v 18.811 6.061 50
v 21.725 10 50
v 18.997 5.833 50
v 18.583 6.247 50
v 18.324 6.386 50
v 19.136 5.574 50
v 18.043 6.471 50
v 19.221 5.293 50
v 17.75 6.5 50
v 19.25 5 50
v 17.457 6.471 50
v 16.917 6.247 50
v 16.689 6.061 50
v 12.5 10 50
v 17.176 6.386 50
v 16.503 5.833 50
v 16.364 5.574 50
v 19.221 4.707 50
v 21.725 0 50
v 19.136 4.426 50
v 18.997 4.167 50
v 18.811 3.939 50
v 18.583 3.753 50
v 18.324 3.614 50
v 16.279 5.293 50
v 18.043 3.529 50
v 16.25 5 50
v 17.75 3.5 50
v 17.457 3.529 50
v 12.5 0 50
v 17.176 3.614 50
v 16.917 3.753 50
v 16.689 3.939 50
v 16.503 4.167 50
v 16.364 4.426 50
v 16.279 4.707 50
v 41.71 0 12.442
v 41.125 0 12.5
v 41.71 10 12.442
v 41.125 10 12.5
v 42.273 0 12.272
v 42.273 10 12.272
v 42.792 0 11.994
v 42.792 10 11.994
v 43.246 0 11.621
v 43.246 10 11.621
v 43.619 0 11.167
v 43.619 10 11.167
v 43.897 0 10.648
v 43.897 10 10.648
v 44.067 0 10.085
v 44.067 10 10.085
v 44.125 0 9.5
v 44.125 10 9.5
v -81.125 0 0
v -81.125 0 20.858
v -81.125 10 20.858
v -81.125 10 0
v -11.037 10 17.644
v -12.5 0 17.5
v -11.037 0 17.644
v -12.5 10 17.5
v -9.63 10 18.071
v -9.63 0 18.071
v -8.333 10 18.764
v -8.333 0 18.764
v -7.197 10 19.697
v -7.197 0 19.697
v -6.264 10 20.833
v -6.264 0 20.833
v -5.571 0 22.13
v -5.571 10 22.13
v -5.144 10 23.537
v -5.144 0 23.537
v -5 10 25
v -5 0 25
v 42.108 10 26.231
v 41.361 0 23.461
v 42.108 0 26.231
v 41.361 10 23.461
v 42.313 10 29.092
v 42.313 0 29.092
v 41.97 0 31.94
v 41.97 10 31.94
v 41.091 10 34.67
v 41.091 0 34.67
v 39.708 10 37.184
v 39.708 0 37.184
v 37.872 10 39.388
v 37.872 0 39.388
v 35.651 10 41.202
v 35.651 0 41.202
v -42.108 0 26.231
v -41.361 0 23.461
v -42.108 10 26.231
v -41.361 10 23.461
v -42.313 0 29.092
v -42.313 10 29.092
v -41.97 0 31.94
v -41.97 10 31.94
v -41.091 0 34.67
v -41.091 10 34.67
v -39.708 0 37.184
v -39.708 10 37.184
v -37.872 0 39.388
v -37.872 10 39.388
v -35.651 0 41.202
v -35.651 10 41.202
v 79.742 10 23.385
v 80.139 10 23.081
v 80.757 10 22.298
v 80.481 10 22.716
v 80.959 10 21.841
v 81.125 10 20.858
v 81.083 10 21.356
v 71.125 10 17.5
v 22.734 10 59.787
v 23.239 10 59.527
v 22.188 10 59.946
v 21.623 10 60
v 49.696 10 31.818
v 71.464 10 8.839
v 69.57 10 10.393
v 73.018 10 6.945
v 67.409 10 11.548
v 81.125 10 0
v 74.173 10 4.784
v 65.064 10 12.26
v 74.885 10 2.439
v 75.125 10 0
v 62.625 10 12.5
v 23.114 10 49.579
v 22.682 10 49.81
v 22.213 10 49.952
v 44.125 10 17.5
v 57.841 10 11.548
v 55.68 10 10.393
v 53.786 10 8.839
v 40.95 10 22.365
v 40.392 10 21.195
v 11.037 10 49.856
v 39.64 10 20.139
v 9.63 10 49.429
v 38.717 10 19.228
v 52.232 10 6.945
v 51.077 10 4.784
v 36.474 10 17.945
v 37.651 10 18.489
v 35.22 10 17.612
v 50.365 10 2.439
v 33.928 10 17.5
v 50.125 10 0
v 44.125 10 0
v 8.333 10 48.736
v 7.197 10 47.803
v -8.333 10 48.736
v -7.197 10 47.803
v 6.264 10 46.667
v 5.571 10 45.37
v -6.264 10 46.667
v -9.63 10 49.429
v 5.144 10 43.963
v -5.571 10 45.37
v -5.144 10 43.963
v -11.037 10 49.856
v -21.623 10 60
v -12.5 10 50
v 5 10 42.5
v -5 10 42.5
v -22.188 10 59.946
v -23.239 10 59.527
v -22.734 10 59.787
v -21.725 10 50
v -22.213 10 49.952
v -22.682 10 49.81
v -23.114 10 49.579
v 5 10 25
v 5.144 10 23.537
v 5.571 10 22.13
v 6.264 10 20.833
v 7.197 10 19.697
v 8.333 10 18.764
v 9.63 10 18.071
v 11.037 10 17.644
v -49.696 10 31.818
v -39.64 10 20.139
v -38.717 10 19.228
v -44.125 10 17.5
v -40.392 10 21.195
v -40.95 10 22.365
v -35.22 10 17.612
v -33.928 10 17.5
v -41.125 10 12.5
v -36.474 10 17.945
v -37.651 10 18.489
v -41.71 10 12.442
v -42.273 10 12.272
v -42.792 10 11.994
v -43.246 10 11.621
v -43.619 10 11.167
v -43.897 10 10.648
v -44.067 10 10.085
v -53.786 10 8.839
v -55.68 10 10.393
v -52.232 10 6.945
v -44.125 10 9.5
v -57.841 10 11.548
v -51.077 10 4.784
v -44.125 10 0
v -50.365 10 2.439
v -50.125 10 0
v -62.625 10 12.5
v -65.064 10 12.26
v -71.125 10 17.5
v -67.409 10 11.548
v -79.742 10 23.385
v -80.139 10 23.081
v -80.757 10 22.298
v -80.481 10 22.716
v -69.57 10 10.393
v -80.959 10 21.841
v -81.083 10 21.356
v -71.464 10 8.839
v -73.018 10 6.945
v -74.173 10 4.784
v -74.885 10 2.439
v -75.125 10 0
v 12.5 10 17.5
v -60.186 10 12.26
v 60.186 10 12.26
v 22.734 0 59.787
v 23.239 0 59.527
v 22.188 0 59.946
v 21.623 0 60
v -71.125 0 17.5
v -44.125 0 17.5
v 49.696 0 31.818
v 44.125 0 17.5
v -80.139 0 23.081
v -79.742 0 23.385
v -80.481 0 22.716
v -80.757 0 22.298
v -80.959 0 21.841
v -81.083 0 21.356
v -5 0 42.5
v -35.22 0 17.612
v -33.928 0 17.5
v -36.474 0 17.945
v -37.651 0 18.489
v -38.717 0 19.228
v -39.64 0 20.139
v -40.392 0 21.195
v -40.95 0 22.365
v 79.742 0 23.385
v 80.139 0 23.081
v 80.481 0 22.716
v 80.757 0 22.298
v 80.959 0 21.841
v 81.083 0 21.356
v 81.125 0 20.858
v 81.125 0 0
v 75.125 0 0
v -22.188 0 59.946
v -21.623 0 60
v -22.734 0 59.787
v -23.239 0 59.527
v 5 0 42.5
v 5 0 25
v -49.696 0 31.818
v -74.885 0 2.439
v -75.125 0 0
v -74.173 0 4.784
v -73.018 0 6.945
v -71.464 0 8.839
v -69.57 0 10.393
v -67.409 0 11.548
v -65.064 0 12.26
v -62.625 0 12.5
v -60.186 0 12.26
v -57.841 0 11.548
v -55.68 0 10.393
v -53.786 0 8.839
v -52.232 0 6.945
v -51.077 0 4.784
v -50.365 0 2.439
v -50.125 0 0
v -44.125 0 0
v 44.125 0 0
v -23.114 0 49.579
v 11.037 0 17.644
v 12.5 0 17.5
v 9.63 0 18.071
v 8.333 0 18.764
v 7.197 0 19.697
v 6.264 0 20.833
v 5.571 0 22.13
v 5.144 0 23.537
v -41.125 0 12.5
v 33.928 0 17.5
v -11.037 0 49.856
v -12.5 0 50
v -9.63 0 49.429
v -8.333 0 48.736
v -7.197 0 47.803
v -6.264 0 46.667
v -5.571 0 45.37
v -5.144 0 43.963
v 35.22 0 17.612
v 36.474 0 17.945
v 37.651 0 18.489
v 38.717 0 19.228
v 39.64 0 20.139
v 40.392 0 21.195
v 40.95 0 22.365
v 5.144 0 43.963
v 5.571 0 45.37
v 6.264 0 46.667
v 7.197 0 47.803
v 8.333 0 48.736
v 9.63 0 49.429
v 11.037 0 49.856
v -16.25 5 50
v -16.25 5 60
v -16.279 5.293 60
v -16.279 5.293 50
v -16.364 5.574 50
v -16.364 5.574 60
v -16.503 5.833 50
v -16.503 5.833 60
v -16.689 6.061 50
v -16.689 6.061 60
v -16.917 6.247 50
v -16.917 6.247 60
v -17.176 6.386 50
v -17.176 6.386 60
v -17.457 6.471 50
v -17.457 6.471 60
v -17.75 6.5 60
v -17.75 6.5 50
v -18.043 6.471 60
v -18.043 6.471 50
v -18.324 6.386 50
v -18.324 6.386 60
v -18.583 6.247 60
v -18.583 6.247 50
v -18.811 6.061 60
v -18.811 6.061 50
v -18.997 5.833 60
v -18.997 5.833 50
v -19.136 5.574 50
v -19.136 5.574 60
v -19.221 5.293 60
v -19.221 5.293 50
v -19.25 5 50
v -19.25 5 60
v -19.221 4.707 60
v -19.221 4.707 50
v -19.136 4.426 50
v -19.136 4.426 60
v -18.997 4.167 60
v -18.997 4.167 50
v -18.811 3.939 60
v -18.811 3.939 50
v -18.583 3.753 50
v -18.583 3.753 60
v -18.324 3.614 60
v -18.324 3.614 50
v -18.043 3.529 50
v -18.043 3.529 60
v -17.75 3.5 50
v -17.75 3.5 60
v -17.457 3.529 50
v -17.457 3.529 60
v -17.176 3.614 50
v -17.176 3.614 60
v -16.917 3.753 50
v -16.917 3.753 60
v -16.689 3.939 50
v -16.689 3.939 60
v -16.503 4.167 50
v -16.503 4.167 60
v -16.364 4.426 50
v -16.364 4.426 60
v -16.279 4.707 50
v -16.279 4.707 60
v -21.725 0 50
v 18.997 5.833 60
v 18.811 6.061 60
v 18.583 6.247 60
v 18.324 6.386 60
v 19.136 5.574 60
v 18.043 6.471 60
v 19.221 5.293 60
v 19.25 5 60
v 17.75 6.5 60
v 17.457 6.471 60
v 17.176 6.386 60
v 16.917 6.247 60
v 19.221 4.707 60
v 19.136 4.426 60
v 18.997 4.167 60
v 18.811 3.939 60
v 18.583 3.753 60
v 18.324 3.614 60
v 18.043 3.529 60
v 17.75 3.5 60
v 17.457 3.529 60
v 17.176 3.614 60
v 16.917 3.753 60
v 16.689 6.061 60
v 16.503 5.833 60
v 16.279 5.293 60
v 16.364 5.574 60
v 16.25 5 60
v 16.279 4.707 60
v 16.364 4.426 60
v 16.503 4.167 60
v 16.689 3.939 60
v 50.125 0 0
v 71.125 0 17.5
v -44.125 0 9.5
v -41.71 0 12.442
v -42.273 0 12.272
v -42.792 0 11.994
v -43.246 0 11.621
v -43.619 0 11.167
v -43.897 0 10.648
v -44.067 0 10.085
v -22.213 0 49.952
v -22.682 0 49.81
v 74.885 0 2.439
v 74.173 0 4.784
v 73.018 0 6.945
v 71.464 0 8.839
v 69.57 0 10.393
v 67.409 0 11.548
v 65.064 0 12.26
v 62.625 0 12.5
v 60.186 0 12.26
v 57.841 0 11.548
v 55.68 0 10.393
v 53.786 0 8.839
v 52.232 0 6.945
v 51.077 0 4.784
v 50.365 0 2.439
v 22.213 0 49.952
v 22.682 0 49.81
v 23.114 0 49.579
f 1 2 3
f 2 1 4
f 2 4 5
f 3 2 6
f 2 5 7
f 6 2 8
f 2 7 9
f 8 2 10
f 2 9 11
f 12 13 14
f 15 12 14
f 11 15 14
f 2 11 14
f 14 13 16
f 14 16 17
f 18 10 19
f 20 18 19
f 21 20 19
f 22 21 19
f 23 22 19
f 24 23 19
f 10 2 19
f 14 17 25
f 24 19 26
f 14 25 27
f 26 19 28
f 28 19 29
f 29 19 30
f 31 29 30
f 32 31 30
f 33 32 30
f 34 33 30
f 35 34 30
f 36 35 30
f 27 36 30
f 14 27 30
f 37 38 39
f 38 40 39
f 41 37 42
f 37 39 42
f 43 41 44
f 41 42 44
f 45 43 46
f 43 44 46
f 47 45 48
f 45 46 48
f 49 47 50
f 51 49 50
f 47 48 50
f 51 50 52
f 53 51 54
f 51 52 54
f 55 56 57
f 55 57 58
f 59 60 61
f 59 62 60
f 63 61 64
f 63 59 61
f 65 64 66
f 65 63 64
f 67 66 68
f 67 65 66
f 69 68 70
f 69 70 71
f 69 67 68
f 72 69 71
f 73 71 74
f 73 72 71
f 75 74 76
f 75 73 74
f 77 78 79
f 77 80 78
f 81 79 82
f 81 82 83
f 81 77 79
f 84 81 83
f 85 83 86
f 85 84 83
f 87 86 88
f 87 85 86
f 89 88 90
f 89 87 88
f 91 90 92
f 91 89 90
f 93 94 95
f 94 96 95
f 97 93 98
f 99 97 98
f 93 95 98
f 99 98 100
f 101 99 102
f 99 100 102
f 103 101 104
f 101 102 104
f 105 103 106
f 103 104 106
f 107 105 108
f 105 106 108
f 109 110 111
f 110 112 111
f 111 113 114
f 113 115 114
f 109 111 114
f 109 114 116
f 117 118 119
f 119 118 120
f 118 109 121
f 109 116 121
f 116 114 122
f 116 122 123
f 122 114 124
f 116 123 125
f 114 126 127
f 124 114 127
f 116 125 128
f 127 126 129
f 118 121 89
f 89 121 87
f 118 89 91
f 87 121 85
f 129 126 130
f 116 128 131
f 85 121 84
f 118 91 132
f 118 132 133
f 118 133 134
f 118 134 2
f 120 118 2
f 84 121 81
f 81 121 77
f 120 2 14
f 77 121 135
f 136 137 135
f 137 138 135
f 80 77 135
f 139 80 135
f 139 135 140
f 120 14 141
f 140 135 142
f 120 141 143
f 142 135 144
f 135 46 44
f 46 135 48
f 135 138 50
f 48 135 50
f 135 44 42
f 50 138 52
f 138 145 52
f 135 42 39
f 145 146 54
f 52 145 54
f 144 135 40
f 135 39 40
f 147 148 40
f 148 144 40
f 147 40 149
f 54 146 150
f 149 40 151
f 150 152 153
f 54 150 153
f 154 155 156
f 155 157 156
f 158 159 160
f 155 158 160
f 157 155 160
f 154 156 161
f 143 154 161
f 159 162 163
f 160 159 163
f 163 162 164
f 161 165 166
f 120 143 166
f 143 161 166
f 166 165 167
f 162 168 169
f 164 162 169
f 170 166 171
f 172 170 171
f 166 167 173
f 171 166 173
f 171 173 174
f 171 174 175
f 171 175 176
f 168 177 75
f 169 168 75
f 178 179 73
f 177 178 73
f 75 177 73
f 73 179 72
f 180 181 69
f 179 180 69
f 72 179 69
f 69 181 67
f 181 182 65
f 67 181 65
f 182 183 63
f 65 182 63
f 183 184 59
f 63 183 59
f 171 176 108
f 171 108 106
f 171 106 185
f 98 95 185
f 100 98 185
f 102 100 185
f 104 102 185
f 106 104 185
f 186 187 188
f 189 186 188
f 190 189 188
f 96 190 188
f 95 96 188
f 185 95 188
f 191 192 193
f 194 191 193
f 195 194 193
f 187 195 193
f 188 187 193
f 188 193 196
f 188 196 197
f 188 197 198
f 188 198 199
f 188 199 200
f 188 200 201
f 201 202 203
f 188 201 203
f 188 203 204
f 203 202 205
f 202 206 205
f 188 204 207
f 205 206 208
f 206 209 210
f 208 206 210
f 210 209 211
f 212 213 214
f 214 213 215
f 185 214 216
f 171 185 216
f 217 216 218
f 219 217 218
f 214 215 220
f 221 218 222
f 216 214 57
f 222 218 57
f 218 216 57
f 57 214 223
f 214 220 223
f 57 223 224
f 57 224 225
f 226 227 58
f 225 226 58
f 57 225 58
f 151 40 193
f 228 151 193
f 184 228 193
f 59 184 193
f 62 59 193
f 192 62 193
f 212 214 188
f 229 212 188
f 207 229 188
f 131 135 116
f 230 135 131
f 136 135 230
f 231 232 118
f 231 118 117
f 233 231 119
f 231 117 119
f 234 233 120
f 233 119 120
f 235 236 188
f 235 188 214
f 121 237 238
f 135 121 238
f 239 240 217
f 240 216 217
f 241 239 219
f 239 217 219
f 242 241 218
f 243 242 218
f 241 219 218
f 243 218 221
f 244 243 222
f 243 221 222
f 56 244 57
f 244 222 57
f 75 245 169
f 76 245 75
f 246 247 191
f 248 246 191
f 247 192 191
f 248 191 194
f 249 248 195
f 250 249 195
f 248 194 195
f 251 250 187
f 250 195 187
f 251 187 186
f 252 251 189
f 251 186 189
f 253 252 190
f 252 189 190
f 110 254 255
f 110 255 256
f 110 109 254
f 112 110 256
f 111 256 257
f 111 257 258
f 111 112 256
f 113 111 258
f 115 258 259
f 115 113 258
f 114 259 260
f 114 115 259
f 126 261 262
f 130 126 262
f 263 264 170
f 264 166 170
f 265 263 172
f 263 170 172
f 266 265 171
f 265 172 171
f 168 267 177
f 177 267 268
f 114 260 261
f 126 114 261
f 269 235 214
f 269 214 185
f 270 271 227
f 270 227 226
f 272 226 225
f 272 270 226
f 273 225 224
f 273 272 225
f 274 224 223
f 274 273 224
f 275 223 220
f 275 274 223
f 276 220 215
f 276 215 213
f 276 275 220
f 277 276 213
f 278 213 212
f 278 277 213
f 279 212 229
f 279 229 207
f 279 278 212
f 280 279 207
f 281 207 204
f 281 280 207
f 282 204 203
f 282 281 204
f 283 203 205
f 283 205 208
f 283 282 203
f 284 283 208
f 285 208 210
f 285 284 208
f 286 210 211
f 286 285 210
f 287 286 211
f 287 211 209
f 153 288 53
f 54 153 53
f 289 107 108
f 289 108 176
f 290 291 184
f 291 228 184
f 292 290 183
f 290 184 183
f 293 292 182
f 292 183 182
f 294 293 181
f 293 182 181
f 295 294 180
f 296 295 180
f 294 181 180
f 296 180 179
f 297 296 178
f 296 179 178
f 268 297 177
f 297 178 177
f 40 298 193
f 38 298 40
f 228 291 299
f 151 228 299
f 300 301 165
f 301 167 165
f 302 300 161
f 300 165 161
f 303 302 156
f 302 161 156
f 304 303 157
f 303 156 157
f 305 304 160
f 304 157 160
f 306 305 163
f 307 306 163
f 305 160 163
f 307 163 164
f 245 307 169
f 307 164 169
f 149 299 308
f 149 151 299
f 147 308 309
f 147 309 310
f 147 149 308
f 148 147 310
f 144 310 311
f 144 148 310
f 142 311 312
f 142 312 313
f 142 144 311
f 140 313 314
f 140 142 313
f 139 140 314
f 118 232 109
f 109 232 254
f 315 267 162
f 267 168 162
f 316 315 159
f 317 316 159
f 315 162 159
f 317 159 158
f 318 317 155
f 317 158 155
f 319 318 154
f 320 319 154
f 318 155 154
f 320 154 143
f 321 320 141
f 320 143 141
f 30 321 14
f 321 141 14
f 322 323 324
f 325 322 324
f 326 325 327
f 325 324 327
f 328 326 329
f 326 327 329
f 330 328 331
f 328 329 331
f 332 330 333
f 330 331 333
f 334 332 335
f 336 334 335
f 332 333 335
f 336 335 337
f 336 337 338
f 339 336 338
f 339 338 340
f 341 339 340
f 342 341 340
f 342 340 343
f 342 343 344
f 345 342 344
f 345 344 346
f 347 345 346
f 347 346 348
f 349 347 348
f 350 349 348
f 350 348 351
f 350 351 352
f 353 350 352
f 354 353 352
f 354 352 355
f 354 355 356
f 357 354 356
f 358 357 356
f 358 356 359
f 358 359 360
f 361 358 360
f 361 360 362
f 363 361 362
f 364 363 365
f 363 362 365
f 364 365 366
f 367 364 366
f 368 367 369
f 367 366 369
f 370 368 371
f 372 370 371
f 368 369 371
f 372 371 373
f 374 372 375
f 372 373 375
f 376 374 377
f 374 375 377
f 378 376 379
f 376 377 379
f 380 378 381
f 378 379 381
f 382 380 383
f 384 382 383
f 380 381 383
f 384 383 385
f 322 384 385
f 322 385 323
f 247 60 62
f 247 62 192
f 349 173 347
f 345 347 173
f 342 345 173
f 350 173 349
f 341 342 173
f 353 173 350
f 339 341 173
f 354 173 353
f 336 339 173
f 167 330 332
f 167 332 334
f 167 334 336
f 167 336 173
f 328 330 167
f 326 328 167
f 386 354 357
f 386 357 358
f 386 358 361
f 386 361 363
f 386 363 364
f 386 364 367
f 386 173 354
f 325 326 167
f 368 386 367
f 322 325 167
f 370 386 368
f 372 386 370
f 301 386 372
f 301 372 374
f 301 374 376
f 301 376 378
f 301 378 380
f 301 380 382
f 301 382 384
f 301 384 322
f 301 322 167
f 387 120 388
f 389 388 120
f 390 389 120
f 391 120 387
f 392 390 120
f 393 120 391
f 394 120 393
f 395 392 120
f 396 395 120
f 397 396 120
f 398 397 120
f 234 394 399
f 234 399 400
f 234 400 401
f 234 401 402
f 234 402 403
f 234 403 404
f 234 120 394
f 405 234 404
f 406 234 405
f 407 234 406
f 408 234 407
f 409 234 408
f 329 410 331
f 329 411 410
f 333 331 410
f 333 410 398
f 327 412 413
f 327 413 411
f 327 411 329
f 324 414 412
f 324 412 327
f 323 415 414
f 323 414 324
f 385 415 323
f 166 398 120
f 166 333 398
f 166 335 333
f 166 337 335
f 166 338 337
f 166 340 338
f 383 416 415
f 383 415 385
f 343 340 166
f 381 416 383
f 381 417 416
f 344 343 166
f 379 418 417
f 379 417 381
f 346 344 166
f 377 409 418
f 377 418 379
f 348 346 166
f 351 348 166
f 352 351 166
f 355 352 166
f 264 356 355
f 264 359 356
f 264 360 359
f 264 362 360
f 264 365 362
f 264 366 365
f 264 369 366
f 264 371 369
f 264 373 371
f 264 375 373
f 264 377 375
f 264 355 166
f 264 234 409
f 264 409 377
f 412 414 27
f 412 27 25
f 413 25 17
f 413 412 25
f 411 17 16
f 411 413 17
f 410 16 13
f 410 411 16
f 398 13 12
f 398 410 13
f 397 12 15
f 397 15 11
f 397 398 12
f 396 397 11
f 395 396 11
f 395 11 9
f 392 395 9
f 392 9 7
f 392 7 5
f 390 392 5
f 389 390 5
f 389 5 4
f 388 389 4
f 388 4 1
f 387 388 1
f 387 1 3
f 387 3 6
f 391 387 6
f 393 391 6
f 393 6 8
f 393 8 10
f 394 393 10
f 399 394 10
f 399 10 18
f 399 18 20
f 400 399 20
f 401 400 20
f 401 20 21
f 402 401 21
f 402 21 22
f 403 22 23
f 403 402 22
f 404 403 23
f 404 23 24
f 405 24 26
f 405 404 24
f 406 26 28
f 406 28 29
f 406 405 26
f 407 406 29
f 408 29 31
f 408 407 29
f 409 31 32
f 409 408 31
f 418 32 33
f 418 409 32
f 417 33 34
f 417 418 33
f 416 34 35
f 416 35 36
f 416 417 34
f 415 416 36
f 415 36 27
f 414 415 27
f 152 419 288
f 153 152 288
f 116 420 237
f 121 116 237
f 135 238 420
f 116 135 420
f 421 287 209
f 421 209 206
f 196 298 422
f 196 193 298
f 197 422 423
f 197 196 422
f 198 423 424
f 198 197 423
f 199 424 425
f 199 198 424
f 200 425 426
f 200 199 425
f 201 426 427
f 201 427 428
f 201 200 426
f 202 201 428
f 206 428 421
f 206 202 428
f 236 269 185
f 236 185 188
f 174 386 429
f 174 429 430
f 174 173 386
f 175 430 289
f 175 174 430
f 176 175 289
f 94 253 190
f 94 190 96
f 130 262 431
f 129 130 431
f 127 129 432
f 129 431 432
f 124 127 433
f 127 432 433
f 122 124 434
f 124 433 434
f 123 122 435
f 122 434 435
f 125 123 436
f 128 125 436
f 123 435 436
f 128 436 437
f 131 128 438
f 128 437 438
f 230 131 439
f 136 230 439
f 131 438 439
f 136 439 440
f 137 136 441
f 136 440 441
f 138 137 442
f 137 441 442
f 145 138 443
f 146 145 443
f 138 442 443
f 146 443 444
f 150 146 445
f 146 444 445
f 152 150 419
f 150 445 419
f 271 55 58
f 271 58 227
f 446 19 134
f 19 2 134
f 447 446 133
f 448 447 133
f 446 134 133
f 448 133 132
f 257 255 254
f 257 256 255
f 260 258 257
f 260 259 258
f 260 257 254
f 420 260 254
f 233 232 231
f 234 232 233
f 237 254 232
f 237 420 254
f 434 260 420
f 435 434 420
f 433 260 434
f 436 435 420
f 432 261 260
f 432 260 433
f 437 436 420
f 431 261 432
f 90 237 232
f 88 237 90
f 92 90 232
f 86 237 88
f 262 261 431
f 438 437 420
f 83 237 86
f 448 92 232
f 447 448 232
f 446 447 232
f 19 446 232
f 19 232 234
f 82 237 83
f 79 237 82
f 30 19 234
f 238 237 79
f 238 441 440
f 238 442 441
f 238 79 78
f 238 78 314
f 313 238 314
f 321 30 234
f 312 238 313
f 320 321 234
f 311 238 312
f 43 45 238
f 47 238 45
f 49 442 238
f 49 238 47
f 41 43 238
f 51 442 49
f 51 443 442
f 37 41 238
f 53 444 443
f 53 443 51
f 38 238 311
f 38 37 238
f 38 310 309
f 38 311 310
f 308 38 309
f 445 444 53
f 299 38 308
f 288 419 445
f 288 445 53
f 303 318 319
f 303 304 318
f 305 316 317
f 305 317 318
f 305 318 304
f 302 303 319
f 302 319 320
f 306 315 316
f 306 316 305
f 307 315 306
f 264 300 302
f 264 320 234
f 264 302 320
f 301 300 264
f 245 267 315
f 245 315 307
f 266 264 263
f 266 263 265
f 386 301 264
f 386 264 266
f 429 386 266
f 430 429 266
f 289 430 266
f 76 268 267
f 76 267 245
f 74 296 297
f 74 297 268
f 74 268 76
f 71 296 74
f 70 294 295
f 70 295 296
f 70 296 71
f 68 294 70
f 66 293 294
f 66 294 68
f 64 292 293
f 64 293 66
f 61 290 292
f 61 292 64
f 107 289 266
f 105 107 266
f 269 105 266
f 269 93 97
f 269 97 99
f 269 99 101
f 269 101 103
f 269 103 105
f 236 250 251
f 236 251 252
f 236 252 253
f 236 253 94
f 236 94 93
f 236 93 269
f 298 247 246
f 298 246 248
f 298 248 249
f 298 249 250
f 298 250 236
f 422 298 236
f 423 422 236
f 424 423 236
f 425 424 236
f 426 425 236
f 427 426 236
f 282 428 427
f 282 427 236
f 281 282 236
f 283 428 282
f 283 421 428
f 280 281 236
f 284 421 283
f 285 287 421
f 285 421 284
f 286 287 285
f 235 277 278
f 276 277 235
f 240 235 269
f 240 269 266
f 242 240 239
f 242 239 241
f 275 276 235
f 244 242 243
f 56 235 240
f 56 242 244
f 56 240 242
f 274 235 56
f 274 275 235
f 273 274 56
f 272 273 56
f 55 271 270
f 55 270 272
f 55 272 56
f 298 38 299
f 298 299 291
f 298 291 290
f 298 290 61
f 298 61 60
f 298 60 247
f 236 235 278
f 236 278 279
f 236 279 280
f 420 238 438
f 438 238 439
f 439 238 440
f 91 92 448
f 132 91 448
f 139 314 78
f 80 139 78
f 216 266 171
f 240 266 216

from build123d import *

# Parameters (mm, degrees)
BOSS_EXTRUDE1_DEPTH = 10
CUT_EXTRUDE5_REACH  = 103.397
SKETCH9_R           = 1.5
FILLET13_R          = 7.5
FILLET14_R          = 15
FILLET16_R          = 7.5
FILLET18_R          = 7.5
FILLET19_R          = 7.5
FILLET22_R          = 3
FILLET23_R          = 3
FILLET24_R          = 15
FILLET28_R          = 3
FILLET29_R          = 3
FILLET30_R          = 3
FILLET31_R          = 3
FILLET32_R          = 7.5
FILLET34_R          = 7.5
FILLET35_R          = 2.5
FILLET36_R          = 2.5


with BuildPart() as part:
    # Sketch1 → Boss-Extrude1 (new body)
    with BuildSketch(Plane(origin=(0, 0, 0), x_dir=(1, 0, 0), z_dir=(0, 1, 0))):
        with BuildLine():
            Line((0, -12.5), (0, -60))
            Line((0, -60), (22.5, -60))
            Line((22.5, -60), (81.125, -22.5))
            Line((81.125, -22.5), (81.125, 0))
            Line((81.125, 0), (75.125, 0))
            ThreePointArc((75.125, 0), (62.625, -12.5), (50.125, 0))
            Line((50.125, 0), (44.125, 0))
            Line((44.125, 0), (44.125, -12.5))
            Line((44.125, -12.5), (0, -12.5))
        make_face()
        Polygon((39.125, -17.5), (45.538841531, -34.595428821), (22.483333333, -50), (5, -50), (5, -17.5), align=None, mode=Mode.SUBTRACT)
        Polygon((71.125, -17.5), (49.69624181, -31.817655806), (44.125, -17.5), align=None, mode=Mode.SUBTRACT)
    boss_extrude1 = extrude(amount=BOSS_EXTRUDE1_DEPTH)

    # Mirror1: Boss-Extrude1 across plane
    add(boss_extrude1.mirror(Plane(origin=(0, 10, 0), x_dir=(0, 0, 1), z_dir=(-1, 0, 0))))

    # Sketch9 → Cut-Extrude5 (cut, up to next)
    with BuildSketch(Plane.XY.offset(60), mode=Mode.PRIVATE) as cut_extrude5_sk1:
        with Locations((-17.75, 5)):
            Circle(SKETCH9_R)
    cut_extrude5_tool1 = extrude(cut_extrude5_sk1.sketch, amount=-CUT_EXTRUDE5_REACH, mode=Mode.PRIVATE) & part.part
    cut_extrude5 = cut_extrude5_tool1.solids().sort_by_distance((-17.75, 5, 60))[0]
    add(cut_extrude5, mode=Mode.SUBTRACT)

    # Mirror2: Cut-Extrude5 across plane
    add(cut_extrude5.mirror(Plane(origin=(0, 0, 0), x_dir=(0, 0, 1), z_dir=(1, 0, 0))), mode=Mode.SUBTRACT)

    # Fillet13
    fillet13_edges = [part.edges().sort_by_distance(p)[0] for p in [
        (39.125, 5, 17.5),
    ]]
    fillet(fillet13_edges, radius=FILLET13_R)

    # Fillet14
    fillet14_edges = [part.edges().sort_by_distance(p)[0] for p in [
        (45.538841531, 5, 34.595428821),
    ]]
    fillet(fillet14_edges, radius=FILLET14_R)

    # Fillet16
    fillet16_edges = [part.edges().sort_by_distance(p)[0] for p in [
        (5, 5, 17.5),
    ]]
    fillet(fillet16_edges, radius=FILLET16_R)

    # Fillet18
    fillet18_edges = [part.edges().sort_by_distance(p)[0] for p in [
        (-5, 5, 17.5),
    ]]
    fillet(fillet18_edges, radius=FILLET18_R)

    # Fillet19
    fillet19_edges = [part.edges().sort_by_distance(p)[0] for p in [
        (-39.125, 5, 17.5),
    ]]
    fillet(fillet19_edges, radius=FILLET19_R)

    # Fillet22
    fillet22_edges = [part.edges().sort_by_distance(p)[0] for p in [
        (44.125, 5, 12.5),
    ]]
    fillet(fillet22_edges, radius=FILLET22_R)

    # Fillet23
    fillet23_edges = [part.edges().sort_by_distance(p)[0] for p in [
        (-44.125, 5, 12.5),
    ]]
    fillet(fillet23_edges, radius=FILLET23_R)

    # Fillet24
    fillet24_edges = [part.edges().sort_by_distance(p)[0] for p in [
        (-45.538841531, 5, 34.595428821),
    ]]
    fillet(fillet24_edges, radius=FILLET24_R)

    # Fillet28
    fillet28_edges = [part.edges().sort_by_distance(p)[0] for p in [
        (22.5, 5, 60),
    ]]
    fillet(fillet28_edges, radius=FILLET28_R)

    # Fillet29
    fillet29_edges = [part.edges().sort_by_distance(p)[0] for p in [
        (-22.5, 5, 60),
    ]]
    fillet(fillet29_edges, radius=FILLET29_R)

    # Fillet30
    fillet30_edges = [part.edges().sort_by_distance(p)[0] for p in [
        (81.125, 5, 22.5),
    ]]
    fillet(fillet30_edges, radius=FILLET30_R)

    # Fillet31
    fillet31_edges = [part.edges().sort_by_distance(p)[0] for p in [
        (-81.125, 5, 22.5),
    ]]
    fillet(fillet31_edges, radius=FILLET31_R)

    # Fillet32
    fillet32_edges = [part.edges().sort_by_distance(p)[0] for p in [
        (-5, 5, 50),
    ]]
    fillet(fillet32_edges, radius=FILLET32_R)

    # Fillet34
    fillet34_edges = [part.edges().sort_by_distance(p)[0] for p in [
        (5, 5, 50),
    ]]
    fillet(fillet34_edges, radius=FILLET34_R)

    # Fillet35
    fillet35_edges = [part.edges().sort_by_distance(p)[0] for p in [
        (-22.483333333, 5, 50),
    ]]
    fillet(fillet35_edges, radius=FILLET35_R)

    # Fillet36
    fillet36_edges = [part.edges().sort_by_distance(p)[0] for p in [
        (22.483333333, 5, 50),
    ]]
    fillet(fillet36_edges, radius=FILLET36_R)


solid = part.part
